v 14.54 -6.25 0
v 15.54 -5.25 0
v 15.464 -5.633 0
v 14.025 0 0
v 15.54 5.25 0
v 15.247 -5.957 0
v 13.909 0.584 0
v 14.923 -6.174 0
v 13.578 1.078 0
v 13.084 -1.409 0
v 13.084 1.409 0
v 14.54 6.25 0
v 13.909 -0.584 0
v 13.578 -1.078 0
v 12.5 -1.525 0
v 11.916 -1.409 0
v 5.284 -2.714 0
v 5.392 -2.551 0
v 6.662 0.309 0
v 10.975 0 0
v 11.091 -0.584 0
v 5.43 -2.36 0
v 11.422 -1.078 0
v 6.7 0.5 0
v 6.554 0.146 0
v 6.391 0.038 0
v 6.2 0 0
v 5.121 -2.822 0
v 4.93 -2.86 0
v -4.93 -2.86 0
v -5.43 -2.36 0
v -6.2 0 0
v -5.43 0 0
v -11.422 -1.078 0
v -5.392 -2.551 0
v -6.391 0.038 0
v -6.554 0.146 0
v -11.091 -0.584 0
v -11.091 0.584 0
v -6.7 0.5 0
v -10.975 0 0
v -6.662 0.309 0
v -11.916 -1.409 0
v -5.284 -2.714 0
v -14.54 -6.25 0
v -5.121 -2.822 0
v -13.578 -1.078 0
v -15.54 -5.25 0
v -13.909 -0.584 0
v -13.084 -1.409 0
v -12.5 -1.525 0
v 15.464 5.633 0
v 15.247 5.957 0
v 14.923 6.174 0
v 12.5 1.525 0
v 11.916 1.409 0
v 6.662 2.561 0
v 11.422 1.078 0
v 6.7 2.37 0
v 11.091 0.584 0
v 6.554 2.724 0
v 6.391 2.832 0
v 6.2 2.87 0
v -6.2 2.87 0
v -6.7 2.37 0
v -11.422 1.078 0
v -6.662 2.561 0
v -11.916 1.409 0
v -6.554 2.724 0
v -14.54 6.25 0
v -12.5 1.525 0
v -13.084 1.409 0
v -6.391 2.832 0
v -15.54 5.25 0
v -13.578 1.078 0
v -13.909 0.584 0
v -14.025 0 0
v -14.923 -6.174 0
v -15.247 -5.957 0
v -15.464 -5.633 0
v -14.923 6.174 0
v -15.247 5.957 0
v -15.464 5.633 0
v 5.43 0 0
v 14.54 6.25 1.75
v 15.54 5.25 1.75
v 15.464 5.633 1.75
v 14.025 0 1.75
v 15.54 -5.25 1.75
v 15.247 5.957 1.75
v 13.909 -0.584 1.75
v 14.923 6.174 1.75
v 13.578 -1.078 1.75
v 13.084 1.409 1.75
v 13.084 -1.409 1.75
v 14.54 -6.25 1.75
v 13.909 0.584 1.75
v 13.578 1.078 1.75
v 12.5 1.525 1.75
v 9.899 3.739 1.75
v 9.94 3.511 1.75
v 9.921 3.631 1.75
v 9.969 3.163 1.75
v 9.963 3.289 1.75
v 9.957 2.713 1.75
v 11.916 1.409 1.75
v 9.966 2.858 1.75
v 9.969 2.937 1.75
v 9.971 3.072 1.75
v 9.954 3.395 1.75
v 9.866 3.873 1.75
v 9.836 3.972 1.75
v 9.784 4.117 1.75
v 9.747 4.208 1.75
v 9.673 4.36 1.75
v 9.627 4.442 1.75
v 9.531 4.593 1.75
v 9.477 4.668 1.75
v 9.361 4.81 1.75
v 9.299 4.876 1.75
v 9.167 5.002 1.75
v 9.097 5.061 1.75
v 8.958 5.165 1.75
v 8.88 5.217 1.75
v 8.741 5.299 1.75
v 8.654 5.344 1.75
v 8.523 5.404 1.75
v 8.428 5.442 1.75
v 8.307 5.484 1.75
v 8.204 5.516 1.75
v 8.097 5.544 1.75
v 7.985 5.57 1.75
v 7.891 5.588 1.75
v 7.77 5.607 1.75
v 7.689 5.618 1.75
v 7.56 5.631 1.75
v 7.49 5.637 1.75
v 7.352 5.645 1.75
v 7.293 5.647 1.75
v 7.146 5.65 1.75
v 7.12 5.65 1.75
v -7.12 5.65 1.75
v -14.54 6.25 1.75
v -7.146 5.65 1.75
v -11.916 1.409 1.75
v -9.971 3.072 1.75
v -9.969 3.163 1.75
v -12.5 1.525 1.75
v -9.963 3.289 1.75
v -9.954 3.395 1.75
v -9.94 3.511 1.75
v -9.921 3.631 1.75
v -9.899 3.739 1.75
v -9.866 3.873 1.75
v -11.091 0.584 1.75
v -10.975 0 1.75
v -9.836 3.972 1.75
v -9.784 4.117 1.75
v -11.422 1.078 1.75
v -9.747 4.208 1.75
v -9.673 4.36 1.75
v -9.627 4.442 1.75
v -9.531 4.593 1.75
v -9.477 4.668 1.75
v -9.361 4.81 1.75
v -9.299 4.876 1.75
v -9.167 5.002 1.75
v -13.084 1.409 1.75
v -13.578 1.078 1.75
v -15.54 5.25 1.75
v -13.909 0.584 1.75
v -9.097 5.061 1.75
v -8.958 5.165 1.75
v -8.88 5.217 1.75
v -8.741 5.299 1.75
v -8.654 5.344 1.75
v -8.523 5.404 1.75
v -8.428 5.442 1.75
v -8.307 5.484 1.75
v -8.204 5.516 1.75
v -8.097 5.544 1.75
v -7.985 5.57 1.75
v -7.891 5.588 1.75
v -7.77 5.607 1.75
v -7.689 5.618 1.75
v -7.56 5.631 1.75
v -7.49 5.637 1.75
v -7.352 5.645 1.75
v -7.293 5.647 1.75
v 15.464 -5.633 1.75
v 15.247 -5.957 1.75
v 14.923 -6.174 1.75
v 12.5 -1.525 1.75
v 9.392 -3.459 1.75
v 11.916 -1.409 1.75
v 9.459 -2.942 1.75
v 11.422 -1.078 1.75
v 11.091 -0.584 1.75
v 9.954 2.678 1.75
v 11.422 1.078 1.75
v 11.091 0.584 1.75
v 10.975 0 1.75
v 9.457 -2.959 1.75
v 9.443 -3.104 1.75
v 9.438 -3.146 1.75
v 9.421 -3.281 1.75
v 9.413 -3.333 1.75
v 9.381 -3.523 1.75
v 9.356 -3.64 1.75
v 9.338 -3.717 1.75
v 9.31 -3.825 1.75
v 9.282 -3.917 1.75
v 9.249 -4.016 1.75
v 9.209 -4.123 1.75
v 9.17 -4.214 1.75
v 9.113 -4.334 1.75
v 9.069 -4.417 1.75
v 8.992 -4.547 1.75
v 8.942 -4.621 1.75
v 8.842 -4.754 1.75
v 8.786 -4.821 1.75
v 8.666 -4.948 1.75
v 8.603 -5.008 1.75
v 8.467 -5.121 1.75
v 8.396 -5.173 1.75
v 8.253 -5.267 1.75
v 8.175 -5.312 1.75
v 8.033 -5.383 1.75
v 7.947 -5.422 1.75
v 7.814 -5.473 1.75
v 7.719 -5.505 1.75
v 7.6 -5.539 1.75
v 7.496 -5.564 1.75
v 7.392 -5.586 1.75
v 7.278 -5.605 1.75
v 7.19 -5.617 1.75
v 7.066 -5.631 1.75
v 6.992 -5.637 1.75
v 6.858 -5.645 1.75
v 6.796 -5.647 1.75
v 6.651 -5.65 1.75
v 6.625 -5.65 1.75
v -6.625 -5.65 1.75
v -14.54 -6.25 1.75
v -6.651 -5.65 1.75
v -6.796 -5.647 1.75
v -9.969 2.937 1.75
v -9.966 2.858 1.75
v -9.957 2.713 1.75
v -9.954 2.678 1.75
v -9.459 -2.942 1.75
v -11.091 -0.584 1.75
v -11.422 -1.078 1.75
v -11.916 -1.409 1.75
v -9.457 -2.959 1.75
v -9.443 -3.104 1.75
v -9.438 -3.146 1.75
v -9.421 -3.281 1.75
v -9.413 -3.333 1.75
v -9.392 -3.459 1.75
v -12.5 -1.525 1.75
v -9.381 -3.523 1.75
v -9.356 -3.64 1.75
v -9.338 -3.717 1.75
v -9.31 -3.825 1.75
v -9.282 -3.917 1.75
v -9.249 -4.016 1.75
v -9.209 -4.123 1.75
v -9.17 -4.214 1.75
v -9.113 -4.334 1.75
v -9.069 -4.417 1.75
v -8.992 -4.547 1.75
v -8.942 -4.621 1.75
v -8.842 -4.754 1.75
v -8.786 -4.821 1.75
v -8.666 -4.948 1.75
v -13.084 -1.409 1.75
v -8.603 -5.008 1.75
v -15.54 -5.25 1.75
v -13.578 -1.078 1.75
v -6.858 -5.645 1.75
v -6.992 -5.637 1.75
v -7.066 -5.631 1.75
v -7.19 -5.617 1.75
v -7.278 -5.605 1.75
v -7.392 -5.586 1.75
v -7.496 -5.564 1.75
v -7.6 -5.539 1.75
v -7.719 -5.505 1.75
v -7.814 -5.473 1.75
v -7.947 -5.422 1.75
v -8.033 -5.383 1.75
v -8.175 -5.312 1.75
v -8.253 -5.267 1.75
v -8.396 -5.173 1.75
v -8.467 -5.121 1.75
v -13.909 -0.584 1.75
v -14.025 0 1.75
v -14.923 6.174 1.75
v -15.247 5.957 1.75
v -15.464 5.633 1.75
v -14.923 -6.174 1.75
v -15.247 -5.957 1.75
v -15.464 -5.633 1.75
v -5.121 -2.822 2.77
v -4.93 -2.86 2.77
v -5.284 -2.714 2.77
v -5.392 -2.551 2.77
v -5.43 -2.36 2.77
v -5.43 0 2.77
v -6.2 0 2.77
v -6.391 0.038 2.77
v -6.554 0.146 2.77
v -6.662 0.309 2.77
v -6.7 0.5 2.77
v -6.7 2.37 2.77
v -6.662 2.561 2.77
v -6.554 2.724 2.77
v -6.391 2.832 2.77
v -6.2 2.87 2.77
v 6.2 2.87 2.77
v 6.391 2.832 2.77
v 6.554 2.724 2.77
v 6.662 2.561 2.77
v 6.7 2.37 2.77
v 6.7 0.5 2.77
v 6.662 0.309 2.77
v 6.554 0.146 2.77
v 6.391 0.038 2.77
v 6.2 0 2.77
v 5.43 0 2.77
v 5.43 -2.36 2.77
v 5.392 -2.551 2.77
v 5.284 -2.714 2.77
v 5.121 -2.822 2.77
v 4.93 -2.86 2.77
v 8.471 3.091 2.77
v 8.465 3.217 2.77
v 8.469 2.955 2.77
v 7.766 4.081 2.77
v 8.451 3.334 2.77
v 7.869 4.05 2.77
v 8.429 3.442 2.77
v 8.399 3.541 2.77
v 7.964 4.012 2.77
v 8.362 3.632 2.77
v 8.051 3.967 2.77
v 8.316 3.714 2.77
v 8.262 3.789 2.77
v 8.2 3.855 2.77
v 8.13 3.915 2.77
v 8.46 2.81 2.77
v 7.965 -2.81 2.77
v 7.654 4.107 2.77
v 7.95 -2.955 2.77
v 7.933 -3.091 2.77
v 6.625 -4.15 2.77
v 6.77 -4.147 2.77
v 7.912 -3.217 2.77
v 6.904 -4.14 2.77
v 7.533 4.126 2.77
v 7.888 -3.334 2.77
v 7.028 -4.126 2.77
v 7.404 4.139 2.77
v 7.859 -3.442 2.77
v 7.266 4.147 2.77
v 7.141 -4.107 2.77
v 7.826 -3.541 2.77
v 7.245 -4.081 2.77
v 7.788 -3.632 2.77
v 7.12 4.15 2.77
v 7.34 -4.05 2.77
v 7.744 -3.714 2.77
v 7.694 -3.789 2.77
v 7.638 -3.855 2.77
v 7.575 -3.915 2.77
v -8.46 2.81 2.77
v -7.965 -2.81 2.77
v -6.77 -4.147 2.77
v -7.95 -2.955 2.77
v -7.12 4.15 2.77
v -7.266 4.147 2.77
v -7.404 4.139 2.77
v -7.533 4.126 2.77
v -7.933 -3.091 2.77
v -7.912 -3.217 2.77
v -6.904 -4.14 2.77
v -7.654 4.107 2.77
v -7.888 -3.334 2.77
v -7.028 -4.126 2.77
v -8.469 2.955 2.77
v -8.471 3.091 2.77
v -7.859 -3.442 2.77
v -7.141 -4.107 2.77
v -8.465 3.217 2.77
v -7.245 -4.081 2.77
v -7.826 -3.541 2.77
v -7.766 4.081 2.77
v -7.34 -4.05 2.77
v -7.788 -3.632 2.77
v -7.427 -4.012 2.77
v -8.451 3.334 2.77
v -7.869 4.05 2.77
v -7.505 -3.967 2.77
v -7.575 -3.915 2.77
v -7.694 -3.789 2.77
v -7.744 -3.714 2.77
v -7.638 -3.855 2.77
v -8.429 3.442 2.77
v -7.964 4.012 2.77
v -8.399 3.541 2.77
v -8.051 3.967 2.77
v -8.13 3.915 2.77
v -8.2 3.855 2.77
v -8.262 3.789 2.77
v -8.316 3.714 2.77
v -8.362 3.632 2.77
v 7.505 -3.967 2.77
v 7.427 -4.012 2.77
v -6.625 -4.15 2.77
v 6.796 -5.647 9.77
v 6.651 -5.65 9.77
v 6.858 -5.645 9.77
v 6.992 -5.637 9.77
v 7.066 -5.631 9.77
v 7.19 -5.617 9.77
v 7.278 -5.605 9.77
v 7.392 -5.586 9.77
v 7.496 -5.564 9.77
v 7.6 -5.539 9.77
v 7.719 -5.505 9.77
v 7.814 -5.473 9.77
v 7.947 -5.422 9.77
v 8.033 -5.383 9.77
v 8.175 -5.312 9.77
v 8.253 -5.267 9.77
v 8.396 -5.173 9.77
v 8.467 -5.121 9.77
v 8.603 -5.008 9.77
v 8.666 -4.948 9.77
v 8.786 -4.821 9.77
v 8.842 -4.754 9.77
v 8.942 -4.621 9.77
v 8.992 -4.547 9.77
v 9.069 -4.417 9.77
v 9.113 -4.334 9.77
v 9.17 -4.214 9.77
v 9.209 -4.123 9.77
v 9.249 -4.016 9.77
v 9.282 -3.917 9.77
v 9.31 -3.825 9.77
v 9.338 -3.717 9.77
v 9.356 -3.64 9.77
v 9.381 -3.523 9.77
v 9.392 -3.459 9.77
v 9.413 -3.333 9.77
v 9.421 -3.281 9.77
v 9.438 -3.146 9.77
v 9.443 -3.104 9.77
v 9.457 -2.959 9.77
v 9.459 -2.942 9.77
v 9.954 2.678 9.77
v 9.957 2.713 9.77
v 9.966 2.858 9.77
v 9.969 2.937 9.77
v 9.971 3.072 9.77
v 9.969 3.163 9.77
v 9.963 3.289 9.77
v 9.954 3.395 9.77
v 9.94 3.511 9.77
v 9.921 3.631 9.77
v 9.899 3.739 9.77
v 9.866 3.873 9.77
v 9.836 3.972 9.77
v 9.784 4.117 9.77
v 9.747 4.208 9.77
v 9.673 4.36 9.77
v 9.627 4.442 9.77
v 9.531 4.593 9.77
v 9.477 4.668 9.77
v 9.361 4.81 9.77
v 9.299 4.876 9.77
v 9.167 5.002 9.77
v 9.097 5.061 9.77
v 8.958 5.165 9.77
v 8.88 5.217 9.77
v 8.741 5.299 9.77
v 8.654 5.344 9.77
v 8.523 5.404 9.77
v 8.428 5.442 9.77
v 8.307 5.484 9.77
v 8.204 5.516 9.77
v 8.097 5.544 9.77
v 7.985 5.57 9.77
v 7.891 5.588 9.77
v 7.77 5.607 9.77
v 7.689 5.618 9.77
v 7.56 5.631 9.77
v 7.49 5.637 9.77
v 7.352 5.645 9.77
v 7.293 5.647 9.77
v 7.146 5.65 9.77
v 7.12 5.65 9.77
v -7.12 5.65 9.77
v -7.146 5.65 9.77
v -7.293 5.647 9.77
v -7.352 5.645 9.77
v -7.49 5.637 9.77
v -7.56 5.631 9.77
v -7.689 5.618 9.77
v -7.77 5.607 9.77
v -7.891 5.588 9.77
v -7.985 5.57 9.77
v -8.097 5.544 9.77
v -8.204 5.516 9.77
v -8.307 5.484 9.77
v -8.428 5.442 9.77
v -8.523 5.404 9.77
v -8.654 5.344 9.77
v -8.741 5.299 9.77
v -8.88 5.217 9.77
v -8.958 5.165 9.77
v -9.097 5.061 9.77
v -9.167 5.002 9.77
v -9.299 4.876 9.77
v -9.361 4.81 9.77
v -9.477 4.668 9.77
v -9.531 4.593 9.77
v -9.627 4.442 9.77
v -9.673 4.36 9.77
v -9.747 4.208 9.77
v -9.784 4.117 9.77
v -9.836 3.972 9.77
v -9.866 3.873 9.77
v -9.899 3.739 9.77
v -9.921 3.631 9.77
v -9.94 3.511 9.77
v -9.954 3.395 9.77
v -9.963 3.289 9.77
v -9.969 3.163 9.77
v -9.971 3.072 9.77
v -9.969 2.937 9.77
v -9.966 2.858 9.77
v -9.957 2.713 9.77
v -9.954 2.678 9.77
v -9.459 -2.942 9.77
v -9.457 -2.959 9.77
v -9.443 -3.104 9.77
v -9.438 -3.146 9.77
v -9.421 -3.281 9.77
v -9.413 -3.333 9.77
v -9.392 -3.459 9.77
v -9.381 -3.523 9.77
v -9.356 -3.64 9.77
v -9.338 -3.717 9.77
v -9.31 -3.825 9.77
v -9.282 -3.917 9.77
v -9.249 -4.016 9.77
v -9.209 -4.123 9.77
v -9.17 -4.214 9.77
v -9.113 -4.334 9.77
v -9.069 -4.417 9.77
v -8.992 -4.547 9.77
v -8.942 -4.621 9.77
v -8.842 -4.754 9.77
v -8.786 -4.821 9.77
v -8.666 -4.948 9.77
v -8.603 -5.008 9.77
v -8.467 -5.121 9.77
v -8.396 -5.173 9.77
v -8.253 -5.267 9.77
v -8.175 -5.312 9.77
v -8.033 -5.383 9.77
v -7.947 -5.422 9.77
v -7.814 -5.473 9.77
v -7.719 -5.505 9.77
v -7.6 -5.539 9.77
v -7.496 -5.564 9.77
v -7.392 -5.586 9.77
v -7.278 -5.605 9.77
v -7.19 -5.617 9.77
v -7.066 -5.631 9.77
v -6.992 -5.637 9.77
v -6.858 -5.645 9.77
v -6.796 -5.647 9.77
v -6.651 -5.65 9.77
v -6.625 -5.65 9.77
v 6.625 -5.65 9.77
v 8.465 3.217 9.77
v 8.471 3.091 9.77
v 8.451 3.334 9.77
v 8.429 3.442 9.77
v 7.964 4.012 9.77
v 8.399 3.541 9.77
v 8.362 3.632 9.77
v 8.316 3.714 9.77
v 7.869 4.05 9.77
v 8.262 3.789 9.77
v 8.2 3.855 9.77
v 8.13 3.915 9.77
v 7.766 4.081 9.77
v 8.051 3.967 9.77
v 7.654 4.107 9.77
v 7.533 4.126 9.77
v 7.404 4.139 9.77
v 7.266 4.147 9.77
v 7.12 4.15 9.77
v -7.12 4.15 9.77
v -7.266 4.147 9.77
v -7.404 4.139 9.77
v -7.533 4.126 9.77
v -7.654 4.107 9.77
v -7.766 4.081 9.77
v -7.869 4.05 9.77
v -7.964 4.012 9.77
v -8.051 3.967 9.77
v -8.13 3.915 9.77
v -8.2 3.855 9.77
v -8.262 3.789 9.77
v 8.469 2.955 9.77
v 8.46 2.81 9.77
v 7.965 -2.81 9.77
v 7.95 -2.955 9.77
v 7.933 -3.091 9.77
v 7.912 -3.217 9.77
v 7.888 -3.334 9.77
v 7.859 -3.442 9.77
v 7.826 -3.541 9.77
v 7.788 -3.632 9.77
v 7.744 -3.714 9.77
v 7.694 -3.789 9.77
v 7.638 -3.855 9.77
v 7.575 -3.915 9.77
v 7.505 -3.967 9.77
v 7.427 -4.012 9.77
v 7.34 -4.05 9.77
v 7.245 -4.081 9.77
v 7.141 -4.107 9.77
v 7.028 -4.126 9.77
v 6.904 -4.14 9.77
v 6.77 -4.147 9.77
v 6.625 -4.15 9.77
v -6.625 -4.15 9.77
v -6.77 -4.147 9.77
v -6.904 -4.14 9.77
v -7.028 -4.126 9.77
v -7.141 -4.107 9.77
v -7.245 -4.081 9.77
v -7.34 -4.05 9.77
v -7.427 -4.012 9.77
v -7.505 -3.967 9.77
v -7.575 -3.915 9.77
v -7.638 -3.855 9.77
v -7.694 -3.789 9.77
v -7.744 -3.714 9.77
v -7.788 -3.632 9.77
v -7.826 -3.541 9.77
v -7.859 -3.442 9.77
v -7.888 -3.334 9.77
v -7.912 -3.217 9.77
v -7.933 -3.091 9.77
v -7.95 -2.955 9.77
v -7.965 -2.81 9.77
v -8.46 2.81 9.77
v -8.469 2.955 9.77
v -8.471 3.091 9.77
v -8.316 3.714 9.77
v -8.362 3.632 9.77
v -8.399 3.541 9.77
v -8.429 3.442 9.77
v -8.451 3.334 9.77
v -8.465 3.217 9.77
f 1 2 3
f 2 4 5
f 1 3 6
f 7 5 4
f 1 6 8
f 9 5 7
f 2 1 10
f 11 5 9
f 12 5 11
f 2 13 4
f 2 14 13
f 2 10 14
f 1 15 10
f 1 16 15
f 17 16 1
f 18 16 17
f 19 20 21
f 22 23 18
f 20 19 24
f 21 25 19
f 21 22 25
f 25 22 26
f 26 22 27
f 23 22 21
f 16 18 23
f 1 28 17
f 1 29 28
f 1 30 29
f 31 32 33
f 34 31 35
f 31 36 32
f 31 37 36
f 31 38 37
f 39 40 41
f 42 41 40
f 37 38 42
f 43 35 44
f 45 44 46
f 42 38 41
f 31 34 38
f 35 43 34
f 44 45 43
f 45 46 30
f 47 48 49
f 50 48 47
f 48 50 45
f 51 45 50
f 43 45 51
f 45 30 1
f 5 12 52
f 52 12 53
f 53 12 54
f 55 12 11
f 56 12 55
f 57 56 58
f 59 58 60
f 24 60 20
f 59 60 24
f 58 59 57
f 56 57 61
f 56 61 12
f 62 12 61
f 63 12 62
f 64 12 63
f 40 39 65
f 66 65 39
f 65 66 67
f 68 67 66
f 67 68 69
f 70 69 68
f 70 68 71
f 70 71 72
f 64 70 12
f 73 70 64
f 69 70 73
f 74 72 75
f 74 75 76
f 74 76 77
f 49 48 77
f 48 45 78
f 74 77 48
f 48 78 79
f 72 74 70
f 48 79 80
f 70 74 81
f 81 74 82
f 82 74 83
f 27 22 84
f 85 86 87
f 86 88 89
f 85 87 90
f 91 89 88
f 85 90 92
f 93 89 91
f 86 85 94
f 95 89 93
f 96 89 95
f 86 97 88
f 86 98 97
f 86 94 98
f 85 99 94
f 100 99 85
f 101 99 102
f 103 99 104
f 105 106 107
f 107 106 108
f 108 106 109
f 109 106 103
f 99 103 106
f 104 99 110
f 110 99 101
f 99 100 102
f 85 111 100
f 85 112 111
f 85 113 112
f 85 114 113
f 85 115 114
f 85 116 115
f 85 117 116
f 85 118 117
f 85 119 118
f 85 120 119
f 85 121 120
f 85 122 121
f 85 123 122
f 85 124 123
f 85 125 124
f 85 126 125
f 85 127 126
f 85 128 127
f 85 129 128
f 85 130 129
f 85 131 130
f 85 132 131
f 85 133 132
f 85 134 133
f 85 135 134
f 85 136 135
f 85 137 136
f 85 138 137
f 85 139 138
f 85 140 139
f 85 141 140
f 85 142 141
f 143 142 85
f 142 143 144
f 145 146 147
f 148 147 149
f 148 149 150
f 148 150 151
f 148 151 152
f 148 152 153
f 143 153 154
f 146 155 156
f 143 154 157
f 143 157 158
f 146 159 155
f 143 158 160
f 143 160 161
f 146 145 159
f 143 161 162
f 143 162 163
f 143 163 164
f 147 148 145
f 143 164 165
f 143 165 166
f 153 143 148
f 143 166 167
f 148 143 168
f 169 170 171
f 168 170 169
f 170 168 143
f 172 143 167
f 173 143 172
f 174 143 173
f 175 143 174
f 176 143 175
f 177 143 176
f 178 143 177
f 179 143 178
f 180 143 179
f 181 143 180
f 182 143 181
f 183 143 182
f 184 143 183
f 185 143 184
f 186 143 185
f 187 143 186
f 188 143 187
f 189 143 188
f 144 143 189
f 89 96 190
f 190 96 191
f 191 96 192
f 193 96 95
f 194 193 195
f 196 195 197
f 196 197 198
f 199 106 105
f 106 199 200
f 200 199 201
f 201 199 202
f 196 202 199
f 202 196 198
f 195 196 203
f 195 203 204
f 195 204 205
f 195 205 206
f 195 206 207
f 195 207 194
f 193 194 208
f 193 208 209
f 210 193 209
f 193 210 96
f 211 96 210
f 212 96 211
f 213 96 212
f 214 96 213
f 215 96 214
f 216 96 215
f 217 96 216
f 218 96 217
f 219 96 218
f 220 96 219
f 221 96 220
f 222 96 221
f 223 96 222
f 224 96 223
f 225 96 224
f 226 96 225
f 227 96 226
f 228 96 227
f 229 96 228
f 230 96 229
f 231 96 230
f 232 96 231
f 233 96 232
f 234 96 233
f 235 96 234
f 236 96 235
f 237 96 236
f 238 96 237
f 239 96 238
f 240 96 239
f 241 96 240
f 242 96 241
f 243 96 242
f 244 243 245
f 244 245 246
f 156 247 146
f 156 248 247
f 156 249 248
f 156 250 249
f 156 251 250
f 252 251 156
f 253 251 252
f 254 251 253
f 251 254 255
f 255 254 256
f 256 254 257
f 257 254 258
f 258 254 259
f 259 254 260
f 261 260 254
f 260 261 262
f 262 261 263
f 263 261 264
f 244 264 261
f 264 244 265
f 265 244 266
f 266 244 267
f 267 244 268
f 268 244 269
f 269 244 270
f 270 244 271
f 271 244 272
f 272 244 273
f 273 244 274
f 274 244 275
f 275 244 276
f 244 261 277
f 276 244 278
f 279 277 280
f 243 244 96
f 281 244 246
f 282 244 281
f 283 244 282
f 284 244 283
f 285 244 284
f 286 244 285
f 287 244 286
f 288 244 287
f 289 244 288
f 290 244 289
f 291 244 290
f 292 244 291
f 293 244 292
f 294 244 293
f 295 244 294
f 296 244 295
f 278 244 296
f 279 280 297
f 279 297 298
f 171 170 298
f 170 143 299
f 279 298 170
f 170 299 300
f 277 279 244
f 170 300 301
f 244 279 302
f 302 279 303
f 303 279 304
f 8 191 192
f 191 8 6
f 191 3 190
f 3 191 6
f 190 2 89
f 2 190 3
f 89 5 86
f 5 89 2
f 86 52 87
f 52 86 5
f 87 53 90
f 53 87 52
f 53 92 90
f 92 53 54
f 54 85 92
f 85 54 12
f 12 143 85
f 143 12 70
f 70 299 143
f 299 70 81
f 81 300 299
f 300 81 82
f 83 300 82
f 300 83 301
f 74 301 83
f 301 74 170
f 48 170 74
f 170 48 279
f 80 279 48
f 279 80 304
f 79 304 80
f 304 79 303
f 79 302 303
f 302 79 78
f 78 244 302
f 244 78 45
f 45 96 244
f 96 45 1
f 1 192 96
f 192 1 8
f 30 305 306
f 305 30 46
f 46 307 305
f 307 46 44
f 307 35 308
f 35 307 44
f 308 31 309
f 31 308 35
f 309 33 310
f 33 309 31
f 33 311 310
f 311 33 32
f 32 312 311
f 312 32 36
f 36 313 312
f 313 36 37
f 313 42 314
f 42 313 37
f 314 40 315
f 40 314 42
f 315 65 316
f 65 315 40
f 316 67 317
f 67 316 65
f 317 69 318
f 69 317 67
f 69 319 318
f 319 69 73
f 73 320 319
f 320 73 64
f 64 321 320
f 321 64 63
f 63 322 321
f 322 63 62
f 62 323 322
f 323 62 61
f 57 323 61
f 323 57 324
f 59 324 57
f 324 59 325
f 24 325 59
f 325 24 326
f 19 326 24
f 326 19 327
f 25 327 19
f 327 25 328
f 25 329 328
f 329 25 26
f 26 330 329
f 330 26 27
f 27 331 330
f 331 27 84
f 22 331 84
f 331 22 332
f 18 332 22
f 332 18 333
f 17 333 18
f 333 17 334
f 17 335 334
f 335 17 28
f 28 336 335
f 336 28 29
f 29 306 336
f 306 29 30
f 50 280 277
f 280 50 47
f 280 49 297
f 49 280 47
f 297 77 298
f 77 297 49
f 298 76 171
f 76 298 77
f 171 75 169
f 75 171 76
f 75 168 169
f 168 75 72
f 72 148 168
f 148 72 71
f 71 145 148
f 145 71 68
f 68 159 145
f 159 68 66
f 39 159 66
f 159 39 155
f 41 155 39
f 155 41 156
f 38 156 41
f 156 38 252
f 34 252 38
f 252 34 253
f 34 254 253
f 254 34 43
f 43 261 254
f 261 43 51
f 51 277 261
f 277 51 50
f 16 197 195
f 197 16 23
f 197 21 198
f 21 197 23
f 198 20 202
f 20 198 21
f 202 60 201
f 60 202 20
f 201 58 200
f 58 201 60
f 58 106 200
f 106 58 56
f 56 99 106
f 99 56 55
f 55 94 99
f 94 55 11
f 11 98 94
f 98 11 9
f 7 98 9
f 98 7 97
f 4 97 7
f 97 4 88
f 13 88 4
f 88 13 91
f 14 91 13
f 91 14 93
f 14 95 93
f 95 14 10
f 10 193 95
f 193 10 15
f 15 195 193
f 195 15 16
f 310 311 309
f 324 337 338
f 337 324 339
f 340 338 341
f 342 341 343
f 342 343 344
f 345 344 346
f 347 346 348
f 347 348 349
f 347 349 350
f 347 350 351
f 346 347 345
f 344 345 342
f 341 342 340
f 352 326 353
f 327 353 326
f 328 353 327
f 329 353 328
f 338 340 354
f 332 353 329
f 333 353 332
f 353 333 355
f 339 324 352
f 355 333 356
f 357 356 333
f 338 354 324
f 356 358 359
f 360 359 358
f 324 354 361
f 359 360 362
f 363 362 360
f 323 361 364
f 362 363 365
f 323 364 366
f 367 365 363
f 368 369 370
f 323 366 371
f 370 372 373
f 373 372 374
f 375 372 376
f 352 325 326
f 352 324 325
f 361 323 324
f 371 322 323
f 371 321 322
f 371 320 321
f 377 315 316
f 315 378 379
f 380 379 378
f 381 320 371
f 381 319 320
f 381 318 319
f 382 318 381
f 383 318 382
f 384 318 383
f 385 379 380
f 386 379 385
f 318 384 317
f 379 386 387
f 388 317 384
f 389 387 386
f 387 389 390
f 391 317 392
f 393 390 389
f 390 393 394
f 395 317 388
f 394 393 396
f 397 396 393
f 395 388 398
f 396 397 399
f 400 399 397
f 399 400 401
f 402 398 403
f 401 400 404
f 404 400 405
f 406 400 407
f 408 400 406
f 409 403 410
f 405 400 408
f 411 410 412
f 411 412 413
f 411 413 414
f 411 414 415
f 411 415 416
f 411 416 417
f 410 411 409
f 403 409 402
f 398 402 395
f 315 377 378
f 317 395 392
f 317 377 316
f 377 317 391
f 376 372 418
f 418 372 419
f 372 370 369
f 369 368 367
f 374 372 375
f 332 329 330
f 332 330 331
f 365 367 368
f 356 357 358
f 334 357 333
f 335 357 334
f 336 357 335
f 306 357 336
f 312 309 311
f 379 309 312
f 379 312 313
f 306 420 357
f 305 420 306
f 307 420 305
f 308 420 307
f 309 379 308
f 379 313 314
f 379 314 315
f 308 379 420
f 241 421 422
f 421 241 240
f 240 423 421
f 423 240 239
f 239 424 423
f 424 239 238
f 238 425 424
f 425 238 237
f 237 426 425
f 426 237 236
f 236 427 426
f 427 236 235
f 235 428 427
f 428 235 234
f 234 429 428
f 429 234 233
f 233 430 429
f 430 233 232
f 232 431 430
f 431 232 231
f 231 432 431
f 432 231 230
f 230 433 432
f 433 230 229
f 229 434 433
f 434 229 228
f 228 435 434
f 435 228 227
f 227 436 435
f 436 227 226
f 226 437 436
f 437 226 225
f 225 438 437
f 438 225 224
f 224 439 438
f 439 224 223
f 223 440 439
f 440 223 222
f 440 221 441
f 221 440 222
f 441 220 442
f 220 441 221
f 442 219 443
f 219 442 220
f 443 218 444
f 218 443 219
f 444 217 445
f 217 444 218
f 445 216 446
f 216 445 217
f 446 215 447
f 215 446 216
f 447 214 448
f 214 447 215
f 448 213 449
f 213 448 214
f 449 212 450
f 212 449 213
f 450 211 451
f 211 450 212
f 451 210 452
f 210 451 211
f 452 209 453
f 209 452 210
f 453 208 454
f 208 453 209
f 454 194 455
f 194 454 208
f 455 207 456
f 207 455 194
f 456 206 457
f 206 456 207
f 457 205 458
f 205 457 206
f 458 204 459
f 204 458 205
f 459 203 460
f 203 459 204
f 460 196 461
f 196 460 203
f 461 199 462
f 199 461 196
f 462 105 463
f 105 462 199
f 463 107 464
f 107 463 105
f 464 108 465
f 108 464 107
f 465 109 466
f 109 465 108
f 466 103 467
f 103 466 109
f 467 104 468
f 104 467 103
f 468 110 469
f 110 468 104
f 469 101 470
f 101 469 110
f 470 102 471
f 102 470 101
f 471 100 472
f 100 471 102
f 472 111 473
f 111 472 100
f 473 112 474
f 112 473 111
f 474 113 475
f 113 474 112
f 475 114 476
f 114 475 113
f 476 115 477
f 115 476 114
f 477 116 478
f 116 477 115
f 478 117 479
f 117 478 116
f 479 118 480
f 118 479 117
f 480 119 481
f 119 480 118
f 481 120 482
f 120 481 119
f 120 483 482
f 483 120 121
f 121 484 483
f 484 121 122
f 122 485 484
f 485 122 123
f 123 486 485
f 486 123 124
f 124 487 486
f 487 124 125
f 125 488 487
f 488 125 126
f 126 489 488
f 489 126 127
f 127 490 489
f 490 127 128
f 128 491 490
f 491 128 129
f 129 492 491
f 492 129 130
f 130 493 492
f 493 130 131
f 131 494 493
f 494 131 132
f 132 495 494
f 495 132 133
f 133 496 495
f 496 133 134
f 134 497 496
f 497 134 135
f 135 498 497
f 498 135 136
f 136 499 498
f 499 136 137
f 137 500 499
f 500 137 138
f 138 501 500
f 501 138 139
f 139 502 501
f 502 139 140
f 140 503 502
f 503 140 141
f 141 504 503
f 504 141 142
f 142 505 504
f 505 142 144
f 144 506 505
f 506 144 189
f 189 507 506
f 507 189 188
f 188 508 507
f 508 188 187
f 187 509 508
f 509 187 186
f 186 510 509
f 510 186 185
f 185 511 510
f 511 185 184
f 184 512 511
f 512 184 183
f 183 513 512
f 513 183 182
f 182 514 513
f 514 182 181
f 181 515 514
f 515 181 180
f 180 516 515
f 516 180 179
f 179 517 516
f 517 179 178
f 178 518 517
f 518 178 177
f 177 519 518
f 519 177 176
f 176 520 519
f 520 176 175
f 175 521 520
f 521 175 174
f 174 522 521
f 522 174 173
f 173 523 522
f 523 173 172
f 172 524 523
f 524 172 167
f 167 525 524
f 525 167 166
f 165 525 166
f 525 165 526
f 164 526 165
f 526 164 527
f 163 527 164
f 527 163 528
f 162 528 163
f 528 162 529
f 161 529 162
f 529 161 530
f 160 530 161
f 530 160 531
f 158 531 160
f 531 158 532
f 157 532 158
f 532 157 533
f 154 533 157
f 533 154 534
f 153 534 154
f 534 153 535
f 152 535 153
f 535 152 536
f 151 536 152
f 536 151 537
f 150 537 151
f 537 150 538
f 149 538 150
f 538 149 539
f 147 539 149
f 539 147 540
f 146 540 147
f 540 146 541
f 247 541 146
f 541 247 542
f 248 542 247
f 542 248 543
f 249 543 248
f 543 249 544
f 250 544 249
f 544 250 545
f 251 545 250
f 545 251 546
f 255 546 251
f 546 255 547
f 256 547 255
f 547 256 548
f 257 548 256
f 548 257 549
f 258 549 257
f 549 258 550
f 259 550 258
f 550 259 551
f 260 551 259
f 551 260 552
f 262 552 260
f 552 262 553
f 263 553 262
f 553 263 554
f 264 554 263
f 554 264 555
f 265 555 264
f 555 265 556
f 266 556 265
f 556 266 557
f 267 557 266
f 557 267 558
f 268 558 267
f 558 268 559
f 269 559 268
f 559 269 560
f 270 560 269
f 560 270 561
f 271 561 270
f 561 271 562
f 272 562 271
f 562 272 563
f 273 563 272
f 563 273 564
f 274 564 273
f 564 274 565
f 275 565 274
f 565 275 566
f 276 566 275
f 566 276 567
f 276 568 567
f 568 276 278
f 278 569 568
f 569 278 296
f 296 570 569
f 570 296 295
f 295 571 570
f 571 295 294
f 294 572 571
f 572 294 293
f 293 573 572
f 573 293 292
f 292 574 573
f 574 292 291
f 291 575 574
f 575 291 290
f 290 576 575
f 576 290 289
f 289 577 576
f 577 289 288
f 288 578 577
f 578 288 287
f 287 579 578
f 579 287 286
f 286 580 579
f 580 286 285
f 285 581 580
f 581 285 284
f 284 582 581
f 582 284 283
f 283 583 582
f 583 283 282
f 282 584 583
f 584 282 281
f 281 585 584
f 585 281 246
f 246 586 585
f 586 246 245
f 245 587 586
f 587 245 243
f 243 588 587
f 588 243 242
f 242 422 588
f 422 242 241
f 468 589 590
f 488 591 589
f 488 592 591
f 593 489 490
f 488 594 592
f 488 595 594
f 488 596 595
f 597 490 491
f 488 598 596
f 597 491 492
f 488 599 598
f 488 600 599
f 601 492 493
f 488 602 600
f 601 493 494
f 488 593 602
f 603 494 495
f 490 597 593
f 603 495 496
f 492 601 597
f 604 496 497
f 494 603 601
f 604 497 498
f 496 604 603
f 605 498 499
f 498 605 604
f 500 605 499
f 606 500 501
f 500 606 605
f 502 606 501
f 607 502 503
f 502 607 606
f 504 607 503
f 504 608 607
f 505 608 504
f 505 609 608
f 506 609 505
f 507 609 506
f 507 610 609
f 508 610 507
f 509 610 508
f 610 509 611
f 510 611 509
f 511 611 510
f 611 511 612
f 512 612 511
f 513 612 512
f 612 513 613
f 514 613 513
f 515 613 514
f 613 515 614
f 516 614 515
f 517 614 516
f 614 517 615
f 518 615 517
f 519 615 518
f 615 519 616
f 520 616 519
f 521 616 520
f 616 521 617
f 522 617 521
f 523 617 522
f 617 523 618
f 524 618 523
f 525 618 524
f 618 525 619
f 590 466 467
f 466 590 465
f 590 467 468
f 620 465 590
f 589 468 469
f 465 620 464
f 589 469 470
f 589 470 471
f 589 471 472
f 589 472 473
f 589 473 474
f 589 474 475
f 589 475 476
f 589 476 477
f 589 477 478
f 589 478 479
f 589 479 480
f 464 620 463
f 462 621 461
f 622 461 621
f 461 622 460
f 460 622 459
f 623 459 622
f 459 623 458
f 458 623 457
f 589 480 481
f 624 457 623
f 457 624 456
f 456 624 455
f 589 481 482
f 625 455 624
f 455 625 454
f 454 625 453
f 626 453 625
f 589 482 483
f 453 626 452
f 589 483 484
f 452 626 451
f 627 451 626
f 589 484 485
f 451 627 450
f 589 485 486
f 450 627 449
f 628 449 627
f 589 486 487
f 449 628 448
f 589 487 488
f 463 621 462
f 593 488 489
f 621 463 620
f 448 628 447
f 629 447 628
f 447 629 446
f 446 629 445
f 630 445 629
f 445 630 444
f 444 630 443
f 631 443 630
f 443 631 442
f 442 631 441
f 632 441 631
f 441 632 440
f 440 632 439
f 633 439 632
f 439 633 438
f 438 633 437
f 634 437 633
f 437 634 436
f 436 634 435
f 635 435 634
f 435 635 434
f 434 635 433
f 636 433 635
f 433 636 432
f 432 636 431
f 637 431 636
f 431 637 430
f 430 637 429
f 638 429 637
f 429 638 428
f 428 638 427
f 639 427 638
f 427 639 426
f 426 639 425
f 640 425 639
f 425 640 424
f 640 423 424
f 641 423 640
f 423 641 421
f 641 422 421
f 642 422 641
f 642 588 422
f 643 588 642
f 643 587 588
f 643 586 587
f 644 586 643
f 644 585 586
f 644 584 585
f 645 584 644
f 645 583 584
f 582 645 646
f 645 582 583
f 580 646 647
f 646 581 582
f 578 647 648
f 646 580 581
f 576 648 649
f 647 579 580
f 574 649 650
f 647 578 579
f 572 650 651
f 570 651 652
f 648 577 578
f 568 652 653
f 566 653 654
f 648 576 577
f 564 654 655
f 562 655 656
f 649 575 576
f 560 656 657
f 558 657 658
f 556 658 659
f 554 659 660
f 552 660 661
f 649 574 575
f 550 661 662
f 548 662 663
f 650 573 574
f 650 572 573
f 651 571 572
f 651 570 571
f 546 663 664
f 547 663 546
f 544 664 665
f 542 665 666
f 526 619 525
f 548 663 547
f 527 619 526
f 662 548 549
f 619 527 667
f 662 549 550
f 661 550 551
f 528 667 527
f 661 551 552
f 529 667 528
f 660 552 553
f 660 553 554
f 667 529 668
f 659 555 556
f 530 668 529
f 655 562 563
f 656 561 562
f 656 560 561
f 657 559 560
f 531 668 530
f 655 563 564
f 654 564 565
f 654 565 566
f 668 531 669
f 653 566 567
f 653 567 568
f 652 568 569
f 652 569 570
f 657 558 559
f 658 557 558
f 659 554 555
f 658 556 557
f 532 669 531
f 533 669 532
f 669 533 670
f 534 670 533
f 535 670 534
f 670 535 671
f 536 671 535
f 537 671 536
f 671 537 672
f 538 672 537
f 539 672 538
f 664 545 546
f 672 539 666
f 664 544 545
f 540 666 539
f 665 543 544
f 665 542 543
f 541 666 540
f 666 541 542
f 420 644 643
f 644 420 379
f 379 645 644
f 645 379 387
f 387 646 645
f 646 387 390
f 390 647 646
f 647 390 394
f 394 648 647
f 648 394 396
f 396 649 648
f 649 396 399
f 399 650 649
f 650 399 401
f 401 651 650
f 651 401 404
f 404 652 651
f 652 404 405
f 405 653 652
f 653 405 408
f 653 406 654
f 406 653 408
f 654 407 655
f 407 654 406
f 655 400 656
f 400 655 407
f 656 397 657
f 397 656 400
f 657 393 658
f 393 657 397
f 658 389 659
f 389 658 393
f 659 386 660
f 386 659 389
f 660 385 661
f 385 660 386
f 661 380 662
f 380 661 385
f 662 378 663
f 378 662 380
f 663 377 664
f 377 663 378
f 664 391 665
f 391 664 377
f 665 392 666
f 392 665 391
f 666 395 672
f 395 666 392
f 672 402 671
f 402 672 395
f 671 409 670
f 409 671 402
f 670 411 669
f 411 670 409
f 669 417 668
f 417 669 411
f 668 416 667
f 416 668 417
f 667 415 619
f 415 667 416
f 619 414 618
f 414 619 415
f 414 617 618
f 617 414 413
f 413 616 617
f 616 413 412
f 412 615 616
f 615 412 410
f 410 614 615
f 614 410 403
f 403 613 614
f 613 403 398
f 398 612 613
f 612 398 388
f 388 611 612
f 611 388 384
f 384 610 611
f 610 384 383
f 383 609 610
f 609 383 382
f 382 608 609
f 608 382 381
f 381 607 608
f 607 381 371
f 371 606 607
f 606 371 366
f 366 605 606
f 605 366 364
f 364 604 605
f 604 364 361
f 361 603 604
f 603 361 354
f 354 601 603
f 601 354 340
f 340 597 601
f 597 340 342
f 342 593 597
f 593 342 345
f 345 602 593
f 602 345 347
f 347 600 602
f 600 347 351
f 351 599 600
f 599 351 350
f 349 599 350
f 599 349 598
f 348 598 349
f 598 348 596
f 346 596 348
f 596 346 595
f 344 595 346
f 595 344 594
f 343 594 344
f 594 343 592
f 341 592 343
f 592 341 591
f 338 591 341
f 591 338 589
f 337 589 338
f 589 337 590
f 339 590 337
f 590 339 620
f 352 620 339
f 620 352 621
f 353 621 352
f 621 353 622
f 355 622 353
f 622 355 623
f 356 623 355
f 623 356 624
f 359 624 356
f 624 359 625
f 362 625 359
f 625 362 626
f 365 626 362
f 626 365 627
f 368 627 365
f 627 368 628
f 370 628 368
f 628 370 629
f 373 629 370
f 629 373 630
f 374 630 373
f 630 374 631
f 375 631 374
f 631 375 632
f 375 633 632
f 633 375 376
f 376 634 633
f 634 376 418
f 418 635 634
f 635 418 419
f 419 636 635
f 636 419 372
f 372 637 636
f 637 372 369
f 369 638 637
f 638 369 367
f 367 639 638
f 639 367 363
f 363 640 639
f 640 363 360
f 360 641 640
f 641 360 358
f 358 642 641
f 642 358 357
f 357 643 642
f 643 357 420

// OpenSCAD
pins = 9;
stripsTolerance = 0.35;
socketWall = 1.5;
socketDepth = 7;
mountThickness = 1.75;
// the jack is the female part that fits inside the socket
jackHeight = 8.3;
jackWidthIncrementBeyondNominalPinSpacing = 3.12;
// official value for db9 is 10.7, but that's not so good for our thicker plastic wall
mountHeight = 12.5;
// official value for db9 is 3.04, but I like 3.75
mountEdgeDistanceBeyondScrews = 3.04;
// official distance for db9 is 4.04, but I like 5.3
screwDistanceFromJack = 4.04;
screwHole = 3.05;

slantAngle = 10;
offset = 1.34;
rounding = 0.75;
stripsHeight = 2.51;
// this is what it should be
nominalPinSpacing = 2.76;
// this is what it is if you use 0.1" header
headerPinSpacing = 2.54;
stripsSpacerDepth = 2.77;
// this might be useful to put down an extra layer of plastic at the bottom to help the header pins stick in place
stripsExtraDepth = 0;
pinHoleDiameter = 0.4;

module end_of_parameters_dummy() {}


//BEGIN: use <bezier.scad>;
/*
Copyright (c) 2017 Alexander R. Pruss.

Licensed under any Creative Commons Attribution license you like or under the
following MIT License.

Permission is hereby granted, free of charge, to any person obtaining a copy
of this software and associated documentation files (the "Software"), to deal
in the Software without restriction, including without limitation the rights
to use, copy, modify, merge, publish, distribute, sublicense, and/or sell
copies of the Software, and to permit persons to whom the Software is
furnished to do so, subject to the following conditions:

The above copyright notice and this permission notice shall be included in all
copies or substantial portions of the Software.

THE SOFTWARE IS PROVIDED "AS IS", WITHOUT WARRANTY OF ANY KIND, EXPRESS OR
IMPLIED, INCLUDING BUT NOT LIMITED TO THE WARRANTIES OF MERCHANTABILITY,
FITNESS FOR A PARTICULAR PURPOSE AND NONINFRINGEMENT. IN NO EVENT SHALL THE
AUTHORS OR COPYRIGHT HOLDERS BE LIABLE FOR ANY CLAIM, DAMAGES OR OTHER
LIABILITY, WHETHER IN AN ACTION OF CONTRACT, TORT OR OTHERWISE, ARISING FROM,
OUT OF OR IN CONNECTION WITH THE SOFTWARE OR THE USE OR OTHER DEALINGS IN THE
SOFTWARE.

*/


// Public domain Bezier stuff from www.thingiverse.com/thing:8443
function BEZ03(u) = pow(1-u, 3);
function BEZ13(u) = 3*u*pow(1-u,2);
function BEZ23(u) = 3*pow(u,2)*(1-u);
function BEZ33(u) = pow(u,3);
function PointAlongBez4(p0, p1, p2, p3, u) =
	BEZ03(u)*p0+BEZ13(u)*p1+BEZ23(u)*p2+BEZ33(u)*p3;
// End public domain Bezier stuff
function d2BEZ03(u) = 6*(1-u);
function d2BEZ13(u) = 18*u-12;
function d2BEZ23(u) = -18*u+6;
function d2BEZ33(u) = 6*u;

function worstCase2ndDerivative(p0, p1, p2, p3, u1, u2)
    = norm([
        for(i=[0:len(p0)-1])
            max([for(u=[u1,u2])
                d2BEZ03(u)*p0[i]+d2BEZ13(u)*p1[i]+
                d2BEZ23(u)*p2[i]+d2BEZ33(u)*p3[i]]) ]);

function neededIntervalLength(p0,p1,p2,p3,u1,u2,tolerance)
    = let(d2=worstCase2ndDerivative(p0,p1,p2,p3,u1,u2))
        d2==0 ? u2-u1+1 : sqrt(2*tolerance/d2);

function REPEAT_MIRRORED(v,angleStart=0,angleEnd=360) = ["m",v,angleStart,angleEnd];
function SMOOTH_REL(x) = ["r",x];
function SMOOTH_ABS(x) = ["a",x];
function SYMMETRIC() = ["r",1];
function OFFSET(v) = ["o",v];
function SHARP() = OFFSET([0,0,0]);
function LINE() = ["l",0];
function POLAR(r,angle) = OFFSET(r*[cos(angle),sin(angle)]);
//function POINT_IS_SPECIAL(v) = (v[0]=="r" || v[0]=="a" || v[0]=="o" || v[0]=="l");

// this does NOT handle offset type points; to handle those, use DecodeBezierOffsets()
function getControlPoint(cp,node,otherCP,otherNode,nextNode) =
    let(v=node-otherCP) (
    cp[0]=="r" ? node+cp[1]*v:
    cp[0]=="a" ? (
        norm(v)<1e-9 ? node+cp[1]*(node-otherNode)/norm(node-otherNode) : node+cp[1]*v/norm(v) ) :
        cp );

function onLine2(a,b,c,eps=1e-4) =
    norm(c-a) <= eps ? true
        : norm(b-a) <= eps ? false /* to be safe */
            : abs((c[1]-a[1])*(b[0]-a[0]) - (b[1]-a[1])*(c[0]-a[0])) <= eps * eps && norm(c-a) <= eps + norm(b-a);

function isStraight2(p1,c1,c2,p2,eps=1e-4) =
    len(p1) == 2 &&
    onLine2(p1,p2,c1,eps=eps) && onLine2(p2,p1,c2,eps=eps);

function Bezier2(p,index=0,precision=0.05,rightEndPoint=true,optimize=true) = let(nPoints=
        max(1, precision < 0 ?
                    ceil(1/
                        neededIntervalLength(p[index],p[index+1],p[index+2],p[index+3],0,1,-precision))
                    : ceil(1/precision)) )
    optimize && isStraight2(p[index],p[index+1],p[index+2],p[index+3]) ? (rightEndPoint?[p[index+0],p[index+3]]:[p[index+0]] ) :
    [for (i=[0:nPoints-(rightEndPoint?0:1)]) PointAlongBez4(p[index+0],p[index+1],p[index+2],p[index+3],i/nPoints)];

function flatten(listOfLists) = [ for(list = listOfLists) for(item = list) item ];


// p is a list of points, in the format:
// [node1,control1,control2,node2,control3, control4,node3, ...]
// You can replace inner control points with:
//   SYMMETRIC: uses a reflection of the control point on the other side of the node
//   SMOOTH_REL(x): like SYMMETRIC, but the distance of the control point to the node is x times the distance of the other control point to the node
//   SMOOTH_ABS(x): like SYMMETRIC, but the distance of the control point to the node is exactly x
// You can also replace any control point with:
//   OFFSET(v): puts the control point at the corresponding node plus the vector v
//   SHARP(): equivalent to OFFSET([0,0])
//   LINE(): when used for both control points between two nodes, generates a straight line
//   POLAR(r,angle): like OFFSET, except the offset is specified in polar coordinates

function DecodeBezierOffset(control,node) = control[0] == "o" ? node+control[1] : control;

function _mirrorMatrix(normalVector) = let(v = normalVector/norm(normalVector)) len(v)<3 ? [[1-2*v[0]*v[0],-2*v[0]*v[1]],[-2*v[0]*v[1],1-2*v[1]*v[1]]] : [[1-2*v[0]*v[0],-2*v[0]*v[1],-2*v[0]*v[2]],[-2*v[0]*v[1],1-2*v[1]*v[1],-2*v[1]*v[2]],[-2*v[0]*v[2],-2*v[1]*v[2],1-2*v[2]*v[2]]];

function _correctLength(p,start=0) =
    start >= len(p) || p[start][0] == "m" ? 3*floor(start/3)+1 : _correctLength(p,start=start+1);

function _trimArray(a, n) = [for (i=[0:n-1]) a[i]];

function _transformPoint(matrix,a) =
    let(n=len(a))
        len(matrix[0])==n+1 ?
            _trimArray(matrix * concat(a,[1]), n)
            : matrix * a;

function _transformPath(matrix,path) =
    [for (a=path) _transformPoint(matrix,a)];

function _reverseArray(array) = let(n=len(array)) [for (i=[0:n-1]) array[n-1-i]];

function _stitchPaths(a,b) = let(na=len(a)) [for (i=[0:na+len(b)-2]) i<na? a[i] : b[i-na+1]-b[0]+a[na-1]];

// replace all OFFSET/SHARP/POLAR points with coordinates
function DecodeBezierOffsets(p) = [for (i=[0:_correctLength(p)-1]) i%3==0?p[i]:(i%3==1?DecodeBezierOffset(p[i],p[i-1]):DecodeBezierOffset(p[i],p[i+1]))];

function _mirrorPaths(basePath, control, start) =
    control[start][0] == "m" ? _mirrorPaths(_stitchPaths(basePath,_reverseArray(_transformPath(_mirrorMatrix( control[start][1] ),basePath))), control, start+1) : basePath;

function DecodeLines(p) = [for (i=[0:len(p)-1])
    i%3==0 || p[i][0] != "l" ? p[i] :
    i%3 == 1 ? (p[i-1]*2+p[i+2])/3 :
    (p[i-2]+p[i+1]*2)/3 ];

function DecodeSpecialBezierPoints(p0) =
    let(
        l = _correctLength(p0),
        doMirror = len(p0)>l && p0[l][0] == "m",
        p1=DecodeLines(p0),
        p=DecodeBezierOffsets(p1),
        basePath = [for (i=[0:l-1]) i%3==0?p[i]:(i%3==1?getControlPoint(p[i],p[i-1],p[i-2],p[i-4],p[i+2]):getControlPoint(p[i],p[i+1],p[i+2],p[i+4],p[i-2]))])
        doMirror ? _mirrorPaths(basePath, p0, l) : basePath;

function Distance2D(a,b) = sqrt((a[0]-b[0])*(a[0]-b[0])+(a[1]-b[1])*(a[1]-b[1]));

function RemoveDuplicates(p,eps=0.00001) = let(safeEps = eps/len(p)) [for (i=[0:len(p)-1]) if(i==0 || i==len(p)-1 || Distance2D(p[i-1],p[i]) >= safeEps) p[i]];

function Bezier(p,precision=0.05,eps=0.00001,optimize=true) = let(q=DecodeSpecialBezierPoints(p), nodes=(len(q)-1)/3) RemoveDuplicates(flatten([for (i=[0:nodes-1]) Bezier2(q,optimize=optimize,index=i*3,precision=precision,rightEndPoint=(i==nodes-1))]),eps=eps);

function GetSplineAngle(a,b,c) =
    a==c && b==a ? 0 :
    a==c ? let(ba=b-a) atan2(ba[1],ba[0]) :
    let(ca=c-a) atan2(ca[1],ca[0]);

/*    let(ba=norm(b-a),cb=norm(c-b))
        ba == 0 && cb == 0 ? 0 :
    let(v = ba == 0 ? c-b :
            cb == 0 ? b-a :
            (c-b)*norm(b-a)/norm(c-b)+(b-a))
    atan2(v[1],v[0]); */

// do a spline around b
function SplineAroundPoint(a,b,c,tension=0.5,includeLeftCP=true,includeRightCP=true) =
    includeLeftCP && includeRightCP ?
        [POLAR(tension*norm(a-b),GetSplineAngle(c,b,a)),b,POLAR(tension*norm(c-b),GetSplineAngle(a,b,c))] :
    includeLeftCP ?
        [POLAR(tension*norm(a-b),GetSplineAngle(c,b,a)),b] :
    includeRightCP ?
        [b,POLAR(tension*norm(c-b),GetSplineAngle(a,b,c))] :
        [b];

function BezierSmoothPoints(points,tension=0.5,closed=false)
    = let (n=len(points))
        flatten(
        closed ? [ for (i=[0:n]) SplineAroundPoint(points[(n+i-1)%n],points[i%n],points[(i+1)%n],tension=tension,includeLeftCP=i>0,includeRightCP=i<n) ] :
        [ for (i=[0:n-1])
            SplineAroundPoint(
            i==0 ? 2*points[0]-points[1] : points[(n+i-1)%n],
            points[i],
            i==n-1 ? 2*points[n-1]-points[n-2] : points[(i+1)%n],tension=tension,includeLeftCP=i>0,includeRightCP=i<n-1  ) ]);

module BezierVisualize(p,precision=0.05,eps=0.00001,lineThickness=0.25,controlLineThickness=0.125,nodeSize=1) {
    $fn = 16;
    dim = len(p[0]);
    module point(size) {
        if (dim==2)
            circle(d=size);
        else
            sphere(d=size);
    }
    p1 = DecodeSpecialBezierPoints(p);
    l = Bezier(p1,precision=precision,eps=eps);
    for (i=[0:len(l)-2]) {
        hull() {
            translate(l[i]) point(lineThickness);
            translate(l[i+1]) point(lineThickness);
        }
    }
    for (i=[0:len(p1)-1]) {
        if (i%3 == 0) {
            color("black") translate(p1[i]) point(nodeSize);
        }
        else {
            node = i%3 == 1 ? i-1 : i+1;
            color("red") translate(p1[i]) point(nodeSize);
            color("red") hull() {
                translate(p1[node]) point(controlLineThickness);
                translate(p1[i]) point(controlLineThickness);
            }
        }
    }
}


//END: use <bezier.scad>;


//BEGIN: use <roundedSquare.scad>;
module roundedSquare(size=[10,10], radius=1, center=false, $fn=16) {
    size1 = (size+0==size) ? [size,size] : size;
    if (radius <= 0) {
        square(size1, center=center);
    }
    else {
        translate(center ? -size1/2 : [0,0])
        hull() {
            translate([radius,radius]) circle(r=radius);
            translate([size1[0]-radius,radius]) circle(r=radius);
            translate([size1[0]-radius,size1[1]-radius]) circle(r=radius);
            translate([radius,size1[1]-radius]) circle(r=radius);
        }
    }
}

module roundedCube(size=[10,10,10], radius=1, center=false, $fn=16) {
    linear_extrude(height=size[2])
    roundedSquare(size=[size[0],size[1]], radius=radius, center=center);
}

module roundedOpenTopBox(size=[10,10,10], radius=2, wall=1, solid=false) {
    render(convexity=2)
    difference() {
        linear_extrude(height=size[2]) roundedSquare(size=[size[0],size[1]], radius=radius);
        if (!solid) {
            translate([0,0,wall])
            linear_extrude(height=size[2]-wall)
            translate([wall,wall]) roundedSquare(size=[size[0]-2*wall,size[1]-2*wall], radius=radius-wall);
        }
    }
}

//END: use <roundedSquare.scad>;



module dummy(){}

stripsDepth = stripsSpacerDepth + stripsExtraDepth;
pinsInRow2 = pins%2 ? (pins+1)/2 : pins/2;
pinsInRow1 = pins%2 ? (pins-1)/2 : pins/2;
jackWidth = pinsInRow2*nominalPinSpacing+jackWidthIncrementBeyondNominalPinSpacing;

pinSpacing = headerPinSpacing;
screwSpacing = jackWidth+ 2 * screwDistanceFromJack;
mountWidth = screwSpacing + 2*mountEdgeDistanceBeyondScrews;
height = jackHeight;
width2 = jackWidth;
width1 = width2-tan(slantAngle)*(height-2*offset);

stripsWidth2 = pinSpacing * pinsInRow2;
stripsWidth1 = pinSpacing * pinsInRow1;
nudge = 0.01;


module roundedTrapezoid(width1,width2,height) {
path = [ [0,0], LINE(), LINE(),
         [width1/2-offset,0], SMOOTH_ABS(offset*rounding), SMOOTH_ABS(offset*rounding),
         [width1/2,offset], LINE(), LINE(),
         [width2/2,height-offset], SMOOTH_ABS(offset*rounding), SMOOTH_ABS(offset*rounding),
         [width2/2-offset,height], LINE(), LINE(), [0,height], REPEAT_MIRRORED([10,0])];
    translate([0,-height/2])
    polygon(Bezier(path));
}

module innerInside() {
    w1 = stripsWidth1+2*stripsTolerance;
    w2 = stripsWidth2+2*stripsTolerance;
    h = stripsHeight+stripsTolerance;
    translate([-w1/2,-h]) roundedSquare([w1,h+nudge+0.5],radius=0.5);
    translate([-w2/2,0]) roundedSquare([w2,h+nudge],radius=0.5);
}

module outerSocket() {
    offset(r=socketWall) roundedTrapezoid(width1,width2,height);
}

//<skip>
linear_extrude(height=mountThickness)
difference() {
    roundedSquare([mountWidth,mountHeight],center=true,radius=1);
    innerInside();
    for (i=[-1,1]) translate([i*(screwSpacing/2),0]) circle($fn=16,d=screwHole);
}

linear_extrude(height=stripsDepth)
difference() {
    outerSocket();
    innerInside();
}

linear_extrude(height=stripsDepth+socketDepth)
difference() {
    outerSocket();
    roundedTrapezoid(width1,width2,height);
}

if (stripsExtraDepth>0)
    linear_extrude(height=stripsExtraDepth) difference() {
        outerSocket();
        for (i=[0,1]) {
            pins = [pinsInRow1,pinsInRow2][i];
            translate([-pins/2*headerPinSpacing+0.5*headerPinSpacing,stripsHeight*(i-0.5)]) {
                for(j=[0:pins-1]) {
                    translate([headerPinSpacing*j,0]) circle(d=pinHoleDiameter,$fn=18);
                }
            }
        }
    }
//</skip>
